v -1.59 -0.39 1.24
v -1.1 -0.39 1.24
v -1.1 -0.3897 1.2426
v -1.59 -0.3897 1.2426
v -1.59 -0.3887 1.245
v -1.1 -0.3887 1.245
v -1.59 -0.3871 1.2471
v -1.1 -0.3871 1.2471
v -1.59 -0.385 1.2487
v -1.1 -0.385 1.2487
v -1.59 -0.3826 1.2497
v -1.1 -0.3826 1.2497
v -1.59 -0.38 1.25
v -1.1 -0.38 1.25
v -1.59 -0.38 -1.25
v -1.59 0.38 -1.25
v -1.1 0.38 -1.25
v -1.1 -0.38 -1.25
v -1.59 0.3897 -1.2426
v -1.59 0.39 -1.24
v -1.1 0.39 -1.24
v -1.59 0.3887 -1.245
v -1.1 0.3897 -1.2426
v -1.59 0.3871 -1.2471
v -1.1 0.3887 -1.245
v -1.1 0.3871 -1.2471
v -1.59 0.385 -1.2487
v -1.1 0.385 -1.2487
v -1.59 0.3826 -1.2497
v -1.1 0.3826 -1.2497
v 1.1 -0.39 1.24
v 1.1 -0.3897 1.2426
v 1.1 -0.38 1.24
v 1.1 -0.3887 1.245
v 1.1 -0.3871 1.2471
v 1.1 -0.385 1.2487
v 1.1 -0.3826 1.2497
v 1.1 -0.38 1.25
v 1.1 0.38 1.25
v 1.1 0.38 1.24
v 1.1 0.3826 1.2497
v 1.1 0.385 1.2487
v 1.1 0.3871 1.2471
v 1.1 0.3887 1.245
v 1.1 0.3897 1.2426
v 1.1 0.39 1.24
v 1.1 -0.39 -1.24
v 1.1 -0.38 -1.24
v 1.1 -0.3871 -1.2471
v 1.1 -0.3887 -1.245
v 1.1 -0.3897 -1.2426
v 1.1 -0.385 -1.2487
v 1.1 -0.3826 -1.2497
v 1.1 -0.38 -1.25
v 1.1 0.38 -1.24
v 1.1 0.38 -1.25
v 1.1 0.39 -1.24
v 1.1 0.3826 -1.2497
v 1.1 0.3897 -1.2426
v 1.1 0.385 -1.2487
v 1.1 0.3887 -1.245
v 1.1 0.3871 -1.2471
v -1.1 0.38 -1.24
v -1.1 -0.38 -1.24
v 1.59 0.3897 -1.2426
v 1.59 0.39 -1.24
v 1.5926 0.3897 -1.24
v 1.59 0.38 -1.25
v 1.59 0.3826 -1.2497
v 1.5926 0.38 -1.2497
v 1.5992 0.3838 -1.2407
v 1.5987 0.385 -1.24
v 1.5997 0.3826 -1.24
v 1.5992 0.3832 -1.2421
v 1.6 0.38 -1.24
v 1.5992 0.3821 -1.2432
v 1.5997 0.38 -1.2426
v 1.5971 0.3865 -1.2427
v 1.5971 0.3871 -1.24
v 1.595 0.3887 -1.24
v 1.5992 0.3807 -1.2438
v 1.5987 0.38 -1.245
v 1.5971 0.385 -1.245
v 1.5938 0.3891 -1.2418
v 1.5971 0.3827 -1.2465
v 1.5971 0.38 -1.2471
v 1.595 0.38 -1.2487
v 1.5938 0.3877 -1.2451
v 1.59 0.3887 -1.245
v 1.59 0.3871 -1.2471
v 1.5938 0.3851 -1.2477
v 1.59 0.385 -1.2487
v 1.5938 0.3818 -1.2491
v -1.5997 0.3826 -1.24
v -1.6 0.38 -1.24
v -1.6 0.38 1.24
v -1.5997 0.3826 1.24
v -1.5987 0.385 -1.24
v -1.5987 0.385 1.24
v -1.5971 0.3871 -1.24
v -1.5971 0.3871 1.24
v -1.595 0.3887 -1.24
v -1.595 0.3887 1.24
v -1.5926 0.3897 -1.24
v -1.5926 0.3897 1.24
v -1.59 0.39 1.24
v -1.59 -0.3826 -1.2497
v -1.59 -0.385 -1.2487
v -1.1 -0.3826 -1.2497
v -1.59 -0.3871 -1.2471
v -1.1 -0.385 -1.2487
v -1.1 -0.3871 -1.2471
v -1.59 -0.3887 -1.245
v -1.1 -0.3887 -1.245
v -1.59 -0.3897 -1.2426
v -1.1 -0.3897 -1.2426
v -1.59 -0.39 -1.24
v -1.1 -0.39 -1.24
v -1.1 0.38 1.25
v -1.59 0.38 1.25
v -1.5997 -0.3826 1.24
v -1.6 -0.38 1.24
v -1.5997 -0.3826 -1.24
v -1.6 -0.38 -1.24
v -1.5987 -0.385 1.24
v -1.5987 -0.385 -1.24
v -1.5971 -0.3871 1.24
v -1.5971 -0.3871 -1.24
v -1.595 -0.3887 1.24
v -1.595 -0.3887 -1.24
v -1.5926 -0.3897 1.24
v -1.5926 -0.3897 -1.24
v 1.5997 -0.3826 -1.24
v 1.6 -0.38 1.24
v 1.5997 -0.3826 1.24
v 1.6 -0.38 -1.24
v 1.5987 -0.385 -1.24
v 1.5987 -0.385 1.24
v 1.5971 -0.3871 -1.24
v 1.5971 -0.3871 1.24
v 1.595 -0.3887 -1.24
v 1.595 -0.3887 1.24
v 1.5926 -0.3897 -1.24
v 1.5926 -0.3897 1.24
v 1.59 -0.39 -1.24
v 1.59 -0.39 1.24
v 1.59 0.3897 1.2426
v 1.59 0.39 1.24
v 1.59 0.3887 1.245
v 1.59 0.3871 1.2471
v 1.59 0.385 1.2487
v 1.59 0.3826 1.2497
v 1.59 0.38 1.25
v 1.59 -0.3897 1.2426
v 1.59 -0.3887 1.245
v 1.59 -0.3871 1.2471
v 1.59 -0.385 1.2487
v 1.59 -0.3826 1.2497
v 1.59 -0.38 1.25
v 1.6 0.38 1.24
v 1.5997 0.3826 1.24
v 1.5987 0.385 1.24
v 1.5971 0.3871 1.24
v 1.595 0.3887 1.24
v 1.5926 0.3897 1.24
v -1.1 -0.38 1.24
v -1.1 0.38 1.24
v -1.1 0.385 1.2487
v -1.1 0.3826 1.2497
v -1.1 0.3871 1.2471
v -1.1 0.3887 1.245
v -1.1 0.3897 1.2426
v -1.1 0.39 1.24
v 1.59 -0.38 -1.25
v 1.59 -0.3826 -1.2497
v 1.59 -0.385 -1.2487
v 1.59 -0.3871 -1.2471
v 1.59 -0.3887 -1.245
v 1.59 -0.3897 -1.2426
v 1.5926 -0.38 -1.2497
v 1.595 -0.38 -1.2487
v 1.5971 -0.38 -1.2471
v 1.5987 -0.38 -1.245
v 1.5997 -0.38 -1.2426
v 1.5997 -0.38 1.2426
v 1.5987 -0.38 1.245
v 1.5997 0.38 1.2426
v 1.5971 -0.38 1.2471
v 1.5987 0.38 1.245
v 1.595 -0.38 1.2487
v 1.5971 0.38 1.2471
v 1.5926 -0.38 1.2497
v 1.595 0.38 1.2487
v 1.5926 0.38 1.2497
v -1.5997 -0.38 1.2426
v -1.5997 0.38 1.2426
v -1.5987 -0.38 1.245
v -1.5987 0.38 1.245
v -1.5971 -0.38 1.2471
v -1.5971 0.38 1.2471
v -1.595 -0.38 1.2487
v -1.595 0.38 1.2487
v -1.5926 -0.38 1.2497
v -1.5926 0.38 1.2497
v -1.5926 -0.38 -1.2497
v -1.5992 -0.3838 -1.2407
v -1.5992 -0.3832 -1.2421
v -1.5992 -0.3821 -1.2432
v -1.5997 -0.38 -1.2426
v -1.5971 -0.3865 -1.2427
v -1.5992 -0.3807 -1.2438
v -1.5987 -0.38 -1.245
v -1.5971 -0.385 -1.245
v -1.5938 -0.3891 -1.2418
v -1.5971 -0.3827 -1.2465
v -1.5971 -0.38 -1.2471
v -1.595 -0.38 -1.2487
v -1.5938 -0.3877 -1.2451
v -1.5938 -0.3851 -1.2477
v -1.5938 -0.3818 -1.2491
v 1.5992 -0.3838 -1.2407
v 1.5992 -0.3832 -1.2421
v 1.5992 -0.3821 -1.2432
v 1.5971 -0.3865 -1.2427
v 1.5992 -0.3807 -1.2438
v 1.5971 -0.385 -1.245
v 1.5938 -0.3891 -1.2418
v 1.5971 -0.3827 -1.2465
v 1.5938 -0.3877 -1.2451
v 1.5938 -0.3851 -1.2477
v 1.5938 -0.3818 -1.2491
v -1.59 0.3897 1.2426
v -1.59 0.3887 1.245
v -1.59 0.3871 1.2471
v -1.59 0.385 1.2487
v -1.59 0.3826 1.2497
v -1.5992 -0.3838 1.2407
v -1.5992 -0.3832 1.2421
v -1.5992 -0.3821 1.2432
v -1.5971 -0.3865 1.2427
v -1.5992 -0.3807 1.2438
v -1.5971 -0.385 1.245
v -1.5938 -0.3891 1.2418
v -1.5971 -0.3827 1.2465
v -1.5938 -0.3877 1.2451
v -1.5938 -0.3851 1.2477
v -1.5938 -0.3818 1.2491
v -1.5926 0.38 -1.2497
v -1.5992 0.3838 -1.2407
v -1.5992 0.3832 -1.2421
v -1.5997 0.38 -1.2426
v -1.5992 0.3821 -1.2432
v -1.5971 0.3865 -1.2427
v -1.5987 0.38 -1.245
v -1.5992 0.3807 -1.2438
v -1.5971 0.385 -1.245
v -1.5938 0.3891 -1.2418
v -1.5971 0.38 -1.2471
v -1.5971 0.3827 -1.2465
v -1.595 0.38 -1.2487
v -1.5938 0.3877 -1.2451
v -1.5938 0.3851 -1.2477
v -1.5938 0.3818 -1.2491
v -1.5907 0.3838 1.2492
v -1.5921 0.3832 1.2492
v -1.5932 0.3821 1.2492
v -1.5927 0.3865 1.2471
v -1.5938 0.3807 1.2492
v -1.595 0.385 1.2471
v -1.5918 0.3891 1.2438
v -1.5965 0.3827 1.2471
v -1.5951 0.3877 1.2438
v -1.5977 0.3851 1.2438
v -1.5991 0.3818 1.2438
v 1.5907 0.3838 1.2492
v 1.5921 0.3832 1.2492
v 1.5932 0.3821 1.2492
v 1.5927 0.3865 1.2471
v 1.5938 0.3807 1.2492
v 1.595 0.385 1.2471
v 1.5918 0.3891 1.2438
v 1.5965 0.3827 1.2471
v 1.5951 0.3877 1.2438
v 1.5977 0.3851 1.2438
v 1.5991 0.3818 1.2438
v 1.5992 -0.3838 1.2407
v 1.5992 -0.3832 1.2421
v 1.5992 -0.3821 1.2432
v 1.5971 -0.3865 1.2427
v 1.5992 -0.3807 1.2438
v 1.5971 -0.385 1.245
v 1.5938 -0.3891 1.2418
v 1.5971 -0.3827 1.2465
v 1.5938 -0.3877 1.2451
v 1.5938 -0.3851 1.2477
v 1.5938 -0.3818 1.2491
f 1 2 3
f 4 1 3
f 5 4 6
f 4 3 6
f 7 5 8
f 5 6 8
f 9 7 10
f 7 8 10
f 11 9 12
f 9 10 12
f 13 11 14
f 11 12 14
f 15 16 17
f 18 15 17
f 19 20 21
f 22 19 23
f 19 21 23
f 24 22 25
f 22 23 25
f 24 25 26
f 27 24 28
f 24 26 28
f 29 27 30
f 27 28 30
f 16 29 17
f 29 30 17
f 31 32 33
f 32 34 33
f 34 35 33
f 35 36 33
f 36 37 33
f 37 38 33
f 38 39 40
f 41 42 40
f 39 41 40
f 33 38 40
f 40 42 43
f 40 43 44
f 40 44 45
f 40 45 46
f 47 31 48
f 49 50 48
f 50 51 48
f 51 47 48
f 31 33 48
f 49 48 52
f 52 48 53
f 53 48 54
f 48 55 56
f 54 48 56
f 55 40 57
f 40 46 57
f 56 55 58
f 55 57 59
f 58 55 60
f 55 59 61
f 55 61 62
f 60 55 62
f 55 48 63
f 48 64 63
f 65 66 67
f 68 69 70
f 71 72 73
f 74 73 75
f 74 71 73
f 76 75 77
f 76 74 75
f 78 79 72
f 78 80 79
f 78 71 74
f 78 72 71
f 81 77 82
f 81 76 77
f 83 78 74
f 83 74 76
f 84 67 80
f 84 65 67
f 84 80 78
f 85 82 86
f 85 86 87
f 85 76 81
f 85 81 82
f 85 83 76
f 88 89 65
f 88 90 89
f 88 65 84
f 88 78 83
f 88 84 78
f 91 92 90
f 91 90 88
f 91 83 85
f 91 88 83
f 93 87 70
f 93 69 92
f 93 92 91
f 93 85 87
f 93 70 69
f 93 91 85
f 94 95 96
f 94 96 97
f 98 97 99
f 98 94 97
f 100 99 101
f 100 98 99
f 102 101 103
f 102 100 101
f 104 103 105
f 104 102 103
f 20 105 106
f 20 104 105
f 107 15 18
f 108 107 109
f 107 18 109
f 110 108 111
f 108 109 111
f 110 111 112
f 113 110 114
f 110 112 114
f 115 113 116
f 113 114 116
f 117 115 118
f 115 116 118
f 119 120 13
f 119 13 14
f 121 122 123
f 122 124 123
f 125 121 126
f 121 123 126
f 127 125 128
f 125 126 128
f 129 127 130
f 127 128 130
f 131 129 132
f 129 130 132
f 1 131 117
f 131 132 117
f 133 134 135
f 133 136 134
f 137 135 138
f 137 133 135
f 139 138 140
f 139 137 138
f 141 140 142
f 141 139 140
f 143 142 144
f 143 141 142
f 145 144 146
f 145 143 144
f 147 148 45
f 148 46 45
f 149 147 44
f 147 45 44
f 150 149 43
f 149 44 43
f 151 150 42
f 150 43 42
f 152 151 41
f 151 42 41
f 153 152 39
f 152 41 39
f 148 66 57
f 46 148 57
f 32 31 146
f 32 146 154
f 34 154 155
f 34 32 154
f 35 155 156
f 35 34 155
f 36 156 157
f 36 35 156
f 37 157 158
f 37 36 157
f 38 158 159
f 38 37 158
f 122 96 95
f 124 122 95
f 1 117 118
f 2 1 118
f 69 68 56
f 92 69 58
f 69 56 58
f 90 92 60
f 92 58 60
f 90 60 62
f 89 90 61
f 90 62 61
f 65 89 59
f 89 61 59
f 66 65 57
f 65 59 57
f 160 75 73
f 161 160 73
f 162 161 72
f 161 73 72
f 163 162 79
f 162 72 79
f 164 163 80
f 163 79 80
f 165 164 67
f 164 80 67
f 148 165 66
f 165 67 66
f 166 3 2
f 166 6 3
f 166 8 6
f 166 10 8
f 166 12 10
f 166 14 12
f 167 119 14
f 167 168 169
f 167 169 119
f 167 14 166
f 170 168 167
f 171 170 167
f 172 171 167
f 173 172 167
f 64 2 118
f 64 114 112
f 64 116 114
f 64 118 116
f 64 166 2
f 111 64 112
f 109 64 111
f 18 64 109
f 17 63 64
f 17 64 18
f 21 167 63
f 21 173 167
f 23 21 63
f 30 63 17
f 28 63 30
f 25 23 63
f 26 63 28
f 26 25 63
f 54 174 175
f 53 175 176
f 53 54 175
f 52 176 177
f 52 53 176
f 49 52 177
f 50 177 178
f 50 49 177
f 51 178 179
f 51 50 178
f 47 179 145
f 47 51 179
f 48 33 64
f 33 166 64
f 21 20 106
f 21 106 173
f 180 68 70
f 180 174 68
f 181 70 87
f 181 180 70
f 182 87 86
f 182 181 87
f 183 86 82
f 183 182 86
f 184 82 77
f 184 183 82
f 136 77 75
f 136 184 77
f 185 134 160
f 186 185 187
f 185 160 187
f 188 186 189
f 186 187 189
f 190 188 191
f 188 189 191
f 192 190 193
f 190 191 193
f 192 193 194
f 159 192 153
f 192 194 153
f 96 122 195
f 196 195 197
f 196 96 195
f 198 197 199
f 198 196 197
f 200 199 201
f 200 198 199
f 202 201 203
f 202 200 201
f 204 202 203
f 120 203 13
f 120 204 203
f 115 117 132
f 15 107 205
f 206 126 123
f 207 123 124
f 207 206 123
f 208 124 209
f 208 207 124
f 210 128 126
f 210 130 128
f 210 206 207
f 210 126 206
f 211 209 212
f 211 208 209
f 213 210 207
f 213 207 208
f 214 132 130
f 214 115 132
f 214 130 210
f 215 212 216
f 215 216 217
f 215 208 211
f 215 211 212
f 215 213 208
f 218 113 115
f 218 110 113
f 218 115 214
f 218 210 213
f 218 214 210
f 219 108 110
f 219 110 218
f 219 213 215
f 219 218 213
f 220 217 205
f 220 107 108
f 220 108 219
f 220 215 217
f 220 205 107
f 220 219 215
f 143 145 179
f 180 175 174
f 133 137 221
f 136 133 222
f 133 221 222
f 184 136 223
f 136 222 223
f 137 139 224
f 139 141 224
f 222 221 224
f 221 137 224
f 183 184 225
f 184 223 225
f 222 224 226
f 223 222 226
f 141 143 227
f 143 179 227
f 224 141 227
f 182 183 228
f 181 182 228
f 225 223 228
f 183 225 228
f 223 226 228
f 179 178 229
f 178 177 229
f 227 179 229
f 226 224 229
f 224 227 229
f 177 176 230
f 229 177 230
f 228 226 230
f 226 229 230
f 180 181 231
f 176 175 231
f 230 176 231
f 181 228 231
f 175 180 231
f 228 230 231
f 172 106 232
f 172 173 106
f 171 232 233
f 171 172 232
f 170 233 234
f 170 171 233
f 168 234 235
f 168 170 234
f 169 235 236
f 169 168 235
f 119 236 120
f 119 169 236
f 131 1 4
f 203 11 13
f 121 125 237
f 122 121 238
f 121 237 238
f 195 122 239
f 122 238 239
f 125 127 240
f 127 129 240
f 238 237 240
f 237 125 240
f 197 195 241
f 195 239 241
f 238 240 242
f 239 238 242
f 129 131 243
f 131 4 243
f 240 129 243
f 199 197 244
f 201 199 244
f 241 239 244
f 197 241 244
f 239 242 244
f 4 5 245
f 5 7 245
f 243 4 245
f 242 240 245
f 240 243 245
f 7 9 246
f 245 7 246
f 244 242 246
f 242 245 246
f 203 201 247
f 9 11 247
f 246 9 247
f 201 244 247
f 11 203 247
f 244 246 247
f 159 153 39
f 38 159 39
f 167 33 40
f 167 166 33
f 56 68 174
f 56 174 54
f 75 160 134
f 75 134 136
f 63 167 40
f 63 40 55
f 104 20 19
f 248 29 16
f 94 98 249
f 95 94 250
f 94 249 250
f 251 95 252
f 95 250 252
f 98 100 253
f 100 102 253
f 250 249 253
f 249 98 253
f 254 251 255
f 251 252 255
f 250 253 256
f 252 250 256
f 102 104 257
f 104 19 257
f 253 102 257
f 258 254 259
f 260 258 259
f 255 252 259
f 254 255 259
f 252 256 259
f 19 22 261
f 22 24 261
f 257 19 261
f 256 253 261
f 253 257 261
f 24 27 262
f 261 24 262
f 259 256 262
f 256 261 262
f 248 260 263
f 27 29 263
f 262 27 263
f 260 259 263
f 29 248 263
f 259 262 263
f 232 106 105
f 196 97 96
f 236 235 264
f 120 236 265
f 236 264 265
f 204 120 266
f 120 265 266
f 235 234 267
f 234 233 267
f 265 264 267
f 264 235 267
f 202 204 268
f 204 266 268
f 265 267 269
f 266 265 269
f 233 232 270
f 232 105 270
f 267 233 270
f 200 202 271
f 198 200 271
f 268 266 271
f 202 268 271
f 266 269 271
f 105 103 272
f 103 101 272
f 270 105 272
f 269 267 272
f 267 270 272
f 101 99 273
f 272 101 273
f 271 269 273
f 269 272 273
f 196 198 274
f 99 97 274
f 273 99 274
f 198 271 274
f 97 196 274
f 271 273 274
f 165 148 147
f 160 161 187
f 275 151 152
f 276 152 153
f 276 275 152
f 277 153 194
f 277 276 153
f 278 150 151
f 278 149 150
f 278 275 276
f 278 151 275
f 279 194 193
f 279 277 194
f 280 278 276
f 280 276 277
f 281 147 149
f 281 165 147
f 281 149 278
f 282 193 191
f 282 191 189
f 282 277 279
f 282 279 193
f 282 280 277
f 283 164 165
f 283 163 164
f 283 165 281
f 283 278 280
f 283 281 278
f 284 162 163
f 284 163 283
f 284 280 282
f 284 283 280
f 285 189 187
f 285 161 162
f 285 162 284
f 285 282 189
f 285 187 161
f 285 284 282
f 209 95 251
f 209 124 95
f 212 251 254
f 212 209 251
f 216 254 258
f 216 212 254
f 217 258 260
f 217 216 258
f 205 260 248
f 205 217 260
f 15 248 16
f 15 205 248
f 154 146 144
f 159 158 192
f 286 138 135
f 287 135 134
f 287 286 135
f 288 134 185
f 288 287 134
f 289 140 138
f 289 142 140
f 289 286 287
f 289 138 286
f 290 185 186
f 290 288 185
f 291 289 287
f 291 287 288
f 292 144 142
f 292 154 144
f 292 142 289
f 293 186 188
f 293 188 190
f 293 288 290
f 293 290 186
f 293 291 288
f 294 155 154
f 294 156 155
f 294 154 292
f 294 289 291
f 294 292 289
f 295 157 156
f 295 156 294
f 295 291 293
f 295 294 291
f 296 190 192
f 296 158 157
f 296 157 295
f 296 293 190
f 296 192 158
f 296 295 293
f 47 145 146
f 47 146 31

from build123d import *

# Parameters (mm, degrees)
SKETCH1_W            = 0.5
SKETCH1_H            = 2.5
THICKNESS_DEPTH      = 0.39
FILLET1_R            = 0.01
SKETCH2_W            = 2.48
SKETCH2_H            = 0.76
BOSS_EXTRUDE2_DEPTH  = 1.1
FILLET1_OF_MIRROR3_R = 0.01


with BuildPart() as part:
    # Sketch1 → THICKNESS (new, symmetric)
    with BuildSketch(Plane(origin=(0, 0, 0), x_dir=(1, 0, 0), z_dir=(0, 1, 0))):
        with Locations((-1.35, 0)):
            Rectangle(SKETCH1_W, SKETCH1_H)
    thickness = extrude(amount=THICKNESS_DEPTH, both=True)

    # Fillet1
    fillet1_edges = [part.edges().sort_by_distance(p)[0] for p in [
        (-1.35, 0.39, -1.25),
        (-1.6, 0.39, 0),
        (-1.35, -0.39, -1.25),
        (-1.35, -0.39, 1.25),
        (-1.6, -0.39, 0),
        (-1.35, 0.39, 1.25),
        (-1.6, 0, -1.25),
        (-1.6, 0, 1.25),
    ]]
    fillet(fillet1_edges, radius=FILLET1_R)

    # Sketch2 → Boss-Extrude2 (add)
    with BuildSketch(Plane(origin=(0, 0, 0), x_dir=(0, 0, -1), z_dir=(1, 0, 0))):
        Rectangle(SKETCH2_W, SKETCH2_H)
    boss_extrude2 = extrude(amount=-BOSS_EXTRUDE2_DEPTH)

    # Mirror3: THICKNESS, Boss-Extrude2 across plane
    add(thickness.mirror(Plane(origin=(0, 0, 0), x_dir=(0, 0, 1), z_dir=(1, 0, 0))))
    add(boss_extrude2.mirror(Plane(origin=(0, 0, 0), x_dir=(0, 0, 1), z_dir=(1, 0, 0))))

    # Fillet1 of Mirror3
    fillet1_of_mirror3_edges = [part.edges().sort_by_distance(p)[0] for p in [
        (1.35, 0.39, -1.25),
        (1.6, 0.39, 0),
        (1.35, -0.39, -1.25),
        (1.35, -0.39, 1.25),
        (1.6, -0.39, 0),
        (1.35, 0.39, 1.25),
        (1.6, 0, -1.25),
        (1.6, 0, 1.25),
    ]]
    fillet(fillet1_of_mirror3_edges, radius=FILLET1_OF_MIRROR3_R)


solid = part.part
